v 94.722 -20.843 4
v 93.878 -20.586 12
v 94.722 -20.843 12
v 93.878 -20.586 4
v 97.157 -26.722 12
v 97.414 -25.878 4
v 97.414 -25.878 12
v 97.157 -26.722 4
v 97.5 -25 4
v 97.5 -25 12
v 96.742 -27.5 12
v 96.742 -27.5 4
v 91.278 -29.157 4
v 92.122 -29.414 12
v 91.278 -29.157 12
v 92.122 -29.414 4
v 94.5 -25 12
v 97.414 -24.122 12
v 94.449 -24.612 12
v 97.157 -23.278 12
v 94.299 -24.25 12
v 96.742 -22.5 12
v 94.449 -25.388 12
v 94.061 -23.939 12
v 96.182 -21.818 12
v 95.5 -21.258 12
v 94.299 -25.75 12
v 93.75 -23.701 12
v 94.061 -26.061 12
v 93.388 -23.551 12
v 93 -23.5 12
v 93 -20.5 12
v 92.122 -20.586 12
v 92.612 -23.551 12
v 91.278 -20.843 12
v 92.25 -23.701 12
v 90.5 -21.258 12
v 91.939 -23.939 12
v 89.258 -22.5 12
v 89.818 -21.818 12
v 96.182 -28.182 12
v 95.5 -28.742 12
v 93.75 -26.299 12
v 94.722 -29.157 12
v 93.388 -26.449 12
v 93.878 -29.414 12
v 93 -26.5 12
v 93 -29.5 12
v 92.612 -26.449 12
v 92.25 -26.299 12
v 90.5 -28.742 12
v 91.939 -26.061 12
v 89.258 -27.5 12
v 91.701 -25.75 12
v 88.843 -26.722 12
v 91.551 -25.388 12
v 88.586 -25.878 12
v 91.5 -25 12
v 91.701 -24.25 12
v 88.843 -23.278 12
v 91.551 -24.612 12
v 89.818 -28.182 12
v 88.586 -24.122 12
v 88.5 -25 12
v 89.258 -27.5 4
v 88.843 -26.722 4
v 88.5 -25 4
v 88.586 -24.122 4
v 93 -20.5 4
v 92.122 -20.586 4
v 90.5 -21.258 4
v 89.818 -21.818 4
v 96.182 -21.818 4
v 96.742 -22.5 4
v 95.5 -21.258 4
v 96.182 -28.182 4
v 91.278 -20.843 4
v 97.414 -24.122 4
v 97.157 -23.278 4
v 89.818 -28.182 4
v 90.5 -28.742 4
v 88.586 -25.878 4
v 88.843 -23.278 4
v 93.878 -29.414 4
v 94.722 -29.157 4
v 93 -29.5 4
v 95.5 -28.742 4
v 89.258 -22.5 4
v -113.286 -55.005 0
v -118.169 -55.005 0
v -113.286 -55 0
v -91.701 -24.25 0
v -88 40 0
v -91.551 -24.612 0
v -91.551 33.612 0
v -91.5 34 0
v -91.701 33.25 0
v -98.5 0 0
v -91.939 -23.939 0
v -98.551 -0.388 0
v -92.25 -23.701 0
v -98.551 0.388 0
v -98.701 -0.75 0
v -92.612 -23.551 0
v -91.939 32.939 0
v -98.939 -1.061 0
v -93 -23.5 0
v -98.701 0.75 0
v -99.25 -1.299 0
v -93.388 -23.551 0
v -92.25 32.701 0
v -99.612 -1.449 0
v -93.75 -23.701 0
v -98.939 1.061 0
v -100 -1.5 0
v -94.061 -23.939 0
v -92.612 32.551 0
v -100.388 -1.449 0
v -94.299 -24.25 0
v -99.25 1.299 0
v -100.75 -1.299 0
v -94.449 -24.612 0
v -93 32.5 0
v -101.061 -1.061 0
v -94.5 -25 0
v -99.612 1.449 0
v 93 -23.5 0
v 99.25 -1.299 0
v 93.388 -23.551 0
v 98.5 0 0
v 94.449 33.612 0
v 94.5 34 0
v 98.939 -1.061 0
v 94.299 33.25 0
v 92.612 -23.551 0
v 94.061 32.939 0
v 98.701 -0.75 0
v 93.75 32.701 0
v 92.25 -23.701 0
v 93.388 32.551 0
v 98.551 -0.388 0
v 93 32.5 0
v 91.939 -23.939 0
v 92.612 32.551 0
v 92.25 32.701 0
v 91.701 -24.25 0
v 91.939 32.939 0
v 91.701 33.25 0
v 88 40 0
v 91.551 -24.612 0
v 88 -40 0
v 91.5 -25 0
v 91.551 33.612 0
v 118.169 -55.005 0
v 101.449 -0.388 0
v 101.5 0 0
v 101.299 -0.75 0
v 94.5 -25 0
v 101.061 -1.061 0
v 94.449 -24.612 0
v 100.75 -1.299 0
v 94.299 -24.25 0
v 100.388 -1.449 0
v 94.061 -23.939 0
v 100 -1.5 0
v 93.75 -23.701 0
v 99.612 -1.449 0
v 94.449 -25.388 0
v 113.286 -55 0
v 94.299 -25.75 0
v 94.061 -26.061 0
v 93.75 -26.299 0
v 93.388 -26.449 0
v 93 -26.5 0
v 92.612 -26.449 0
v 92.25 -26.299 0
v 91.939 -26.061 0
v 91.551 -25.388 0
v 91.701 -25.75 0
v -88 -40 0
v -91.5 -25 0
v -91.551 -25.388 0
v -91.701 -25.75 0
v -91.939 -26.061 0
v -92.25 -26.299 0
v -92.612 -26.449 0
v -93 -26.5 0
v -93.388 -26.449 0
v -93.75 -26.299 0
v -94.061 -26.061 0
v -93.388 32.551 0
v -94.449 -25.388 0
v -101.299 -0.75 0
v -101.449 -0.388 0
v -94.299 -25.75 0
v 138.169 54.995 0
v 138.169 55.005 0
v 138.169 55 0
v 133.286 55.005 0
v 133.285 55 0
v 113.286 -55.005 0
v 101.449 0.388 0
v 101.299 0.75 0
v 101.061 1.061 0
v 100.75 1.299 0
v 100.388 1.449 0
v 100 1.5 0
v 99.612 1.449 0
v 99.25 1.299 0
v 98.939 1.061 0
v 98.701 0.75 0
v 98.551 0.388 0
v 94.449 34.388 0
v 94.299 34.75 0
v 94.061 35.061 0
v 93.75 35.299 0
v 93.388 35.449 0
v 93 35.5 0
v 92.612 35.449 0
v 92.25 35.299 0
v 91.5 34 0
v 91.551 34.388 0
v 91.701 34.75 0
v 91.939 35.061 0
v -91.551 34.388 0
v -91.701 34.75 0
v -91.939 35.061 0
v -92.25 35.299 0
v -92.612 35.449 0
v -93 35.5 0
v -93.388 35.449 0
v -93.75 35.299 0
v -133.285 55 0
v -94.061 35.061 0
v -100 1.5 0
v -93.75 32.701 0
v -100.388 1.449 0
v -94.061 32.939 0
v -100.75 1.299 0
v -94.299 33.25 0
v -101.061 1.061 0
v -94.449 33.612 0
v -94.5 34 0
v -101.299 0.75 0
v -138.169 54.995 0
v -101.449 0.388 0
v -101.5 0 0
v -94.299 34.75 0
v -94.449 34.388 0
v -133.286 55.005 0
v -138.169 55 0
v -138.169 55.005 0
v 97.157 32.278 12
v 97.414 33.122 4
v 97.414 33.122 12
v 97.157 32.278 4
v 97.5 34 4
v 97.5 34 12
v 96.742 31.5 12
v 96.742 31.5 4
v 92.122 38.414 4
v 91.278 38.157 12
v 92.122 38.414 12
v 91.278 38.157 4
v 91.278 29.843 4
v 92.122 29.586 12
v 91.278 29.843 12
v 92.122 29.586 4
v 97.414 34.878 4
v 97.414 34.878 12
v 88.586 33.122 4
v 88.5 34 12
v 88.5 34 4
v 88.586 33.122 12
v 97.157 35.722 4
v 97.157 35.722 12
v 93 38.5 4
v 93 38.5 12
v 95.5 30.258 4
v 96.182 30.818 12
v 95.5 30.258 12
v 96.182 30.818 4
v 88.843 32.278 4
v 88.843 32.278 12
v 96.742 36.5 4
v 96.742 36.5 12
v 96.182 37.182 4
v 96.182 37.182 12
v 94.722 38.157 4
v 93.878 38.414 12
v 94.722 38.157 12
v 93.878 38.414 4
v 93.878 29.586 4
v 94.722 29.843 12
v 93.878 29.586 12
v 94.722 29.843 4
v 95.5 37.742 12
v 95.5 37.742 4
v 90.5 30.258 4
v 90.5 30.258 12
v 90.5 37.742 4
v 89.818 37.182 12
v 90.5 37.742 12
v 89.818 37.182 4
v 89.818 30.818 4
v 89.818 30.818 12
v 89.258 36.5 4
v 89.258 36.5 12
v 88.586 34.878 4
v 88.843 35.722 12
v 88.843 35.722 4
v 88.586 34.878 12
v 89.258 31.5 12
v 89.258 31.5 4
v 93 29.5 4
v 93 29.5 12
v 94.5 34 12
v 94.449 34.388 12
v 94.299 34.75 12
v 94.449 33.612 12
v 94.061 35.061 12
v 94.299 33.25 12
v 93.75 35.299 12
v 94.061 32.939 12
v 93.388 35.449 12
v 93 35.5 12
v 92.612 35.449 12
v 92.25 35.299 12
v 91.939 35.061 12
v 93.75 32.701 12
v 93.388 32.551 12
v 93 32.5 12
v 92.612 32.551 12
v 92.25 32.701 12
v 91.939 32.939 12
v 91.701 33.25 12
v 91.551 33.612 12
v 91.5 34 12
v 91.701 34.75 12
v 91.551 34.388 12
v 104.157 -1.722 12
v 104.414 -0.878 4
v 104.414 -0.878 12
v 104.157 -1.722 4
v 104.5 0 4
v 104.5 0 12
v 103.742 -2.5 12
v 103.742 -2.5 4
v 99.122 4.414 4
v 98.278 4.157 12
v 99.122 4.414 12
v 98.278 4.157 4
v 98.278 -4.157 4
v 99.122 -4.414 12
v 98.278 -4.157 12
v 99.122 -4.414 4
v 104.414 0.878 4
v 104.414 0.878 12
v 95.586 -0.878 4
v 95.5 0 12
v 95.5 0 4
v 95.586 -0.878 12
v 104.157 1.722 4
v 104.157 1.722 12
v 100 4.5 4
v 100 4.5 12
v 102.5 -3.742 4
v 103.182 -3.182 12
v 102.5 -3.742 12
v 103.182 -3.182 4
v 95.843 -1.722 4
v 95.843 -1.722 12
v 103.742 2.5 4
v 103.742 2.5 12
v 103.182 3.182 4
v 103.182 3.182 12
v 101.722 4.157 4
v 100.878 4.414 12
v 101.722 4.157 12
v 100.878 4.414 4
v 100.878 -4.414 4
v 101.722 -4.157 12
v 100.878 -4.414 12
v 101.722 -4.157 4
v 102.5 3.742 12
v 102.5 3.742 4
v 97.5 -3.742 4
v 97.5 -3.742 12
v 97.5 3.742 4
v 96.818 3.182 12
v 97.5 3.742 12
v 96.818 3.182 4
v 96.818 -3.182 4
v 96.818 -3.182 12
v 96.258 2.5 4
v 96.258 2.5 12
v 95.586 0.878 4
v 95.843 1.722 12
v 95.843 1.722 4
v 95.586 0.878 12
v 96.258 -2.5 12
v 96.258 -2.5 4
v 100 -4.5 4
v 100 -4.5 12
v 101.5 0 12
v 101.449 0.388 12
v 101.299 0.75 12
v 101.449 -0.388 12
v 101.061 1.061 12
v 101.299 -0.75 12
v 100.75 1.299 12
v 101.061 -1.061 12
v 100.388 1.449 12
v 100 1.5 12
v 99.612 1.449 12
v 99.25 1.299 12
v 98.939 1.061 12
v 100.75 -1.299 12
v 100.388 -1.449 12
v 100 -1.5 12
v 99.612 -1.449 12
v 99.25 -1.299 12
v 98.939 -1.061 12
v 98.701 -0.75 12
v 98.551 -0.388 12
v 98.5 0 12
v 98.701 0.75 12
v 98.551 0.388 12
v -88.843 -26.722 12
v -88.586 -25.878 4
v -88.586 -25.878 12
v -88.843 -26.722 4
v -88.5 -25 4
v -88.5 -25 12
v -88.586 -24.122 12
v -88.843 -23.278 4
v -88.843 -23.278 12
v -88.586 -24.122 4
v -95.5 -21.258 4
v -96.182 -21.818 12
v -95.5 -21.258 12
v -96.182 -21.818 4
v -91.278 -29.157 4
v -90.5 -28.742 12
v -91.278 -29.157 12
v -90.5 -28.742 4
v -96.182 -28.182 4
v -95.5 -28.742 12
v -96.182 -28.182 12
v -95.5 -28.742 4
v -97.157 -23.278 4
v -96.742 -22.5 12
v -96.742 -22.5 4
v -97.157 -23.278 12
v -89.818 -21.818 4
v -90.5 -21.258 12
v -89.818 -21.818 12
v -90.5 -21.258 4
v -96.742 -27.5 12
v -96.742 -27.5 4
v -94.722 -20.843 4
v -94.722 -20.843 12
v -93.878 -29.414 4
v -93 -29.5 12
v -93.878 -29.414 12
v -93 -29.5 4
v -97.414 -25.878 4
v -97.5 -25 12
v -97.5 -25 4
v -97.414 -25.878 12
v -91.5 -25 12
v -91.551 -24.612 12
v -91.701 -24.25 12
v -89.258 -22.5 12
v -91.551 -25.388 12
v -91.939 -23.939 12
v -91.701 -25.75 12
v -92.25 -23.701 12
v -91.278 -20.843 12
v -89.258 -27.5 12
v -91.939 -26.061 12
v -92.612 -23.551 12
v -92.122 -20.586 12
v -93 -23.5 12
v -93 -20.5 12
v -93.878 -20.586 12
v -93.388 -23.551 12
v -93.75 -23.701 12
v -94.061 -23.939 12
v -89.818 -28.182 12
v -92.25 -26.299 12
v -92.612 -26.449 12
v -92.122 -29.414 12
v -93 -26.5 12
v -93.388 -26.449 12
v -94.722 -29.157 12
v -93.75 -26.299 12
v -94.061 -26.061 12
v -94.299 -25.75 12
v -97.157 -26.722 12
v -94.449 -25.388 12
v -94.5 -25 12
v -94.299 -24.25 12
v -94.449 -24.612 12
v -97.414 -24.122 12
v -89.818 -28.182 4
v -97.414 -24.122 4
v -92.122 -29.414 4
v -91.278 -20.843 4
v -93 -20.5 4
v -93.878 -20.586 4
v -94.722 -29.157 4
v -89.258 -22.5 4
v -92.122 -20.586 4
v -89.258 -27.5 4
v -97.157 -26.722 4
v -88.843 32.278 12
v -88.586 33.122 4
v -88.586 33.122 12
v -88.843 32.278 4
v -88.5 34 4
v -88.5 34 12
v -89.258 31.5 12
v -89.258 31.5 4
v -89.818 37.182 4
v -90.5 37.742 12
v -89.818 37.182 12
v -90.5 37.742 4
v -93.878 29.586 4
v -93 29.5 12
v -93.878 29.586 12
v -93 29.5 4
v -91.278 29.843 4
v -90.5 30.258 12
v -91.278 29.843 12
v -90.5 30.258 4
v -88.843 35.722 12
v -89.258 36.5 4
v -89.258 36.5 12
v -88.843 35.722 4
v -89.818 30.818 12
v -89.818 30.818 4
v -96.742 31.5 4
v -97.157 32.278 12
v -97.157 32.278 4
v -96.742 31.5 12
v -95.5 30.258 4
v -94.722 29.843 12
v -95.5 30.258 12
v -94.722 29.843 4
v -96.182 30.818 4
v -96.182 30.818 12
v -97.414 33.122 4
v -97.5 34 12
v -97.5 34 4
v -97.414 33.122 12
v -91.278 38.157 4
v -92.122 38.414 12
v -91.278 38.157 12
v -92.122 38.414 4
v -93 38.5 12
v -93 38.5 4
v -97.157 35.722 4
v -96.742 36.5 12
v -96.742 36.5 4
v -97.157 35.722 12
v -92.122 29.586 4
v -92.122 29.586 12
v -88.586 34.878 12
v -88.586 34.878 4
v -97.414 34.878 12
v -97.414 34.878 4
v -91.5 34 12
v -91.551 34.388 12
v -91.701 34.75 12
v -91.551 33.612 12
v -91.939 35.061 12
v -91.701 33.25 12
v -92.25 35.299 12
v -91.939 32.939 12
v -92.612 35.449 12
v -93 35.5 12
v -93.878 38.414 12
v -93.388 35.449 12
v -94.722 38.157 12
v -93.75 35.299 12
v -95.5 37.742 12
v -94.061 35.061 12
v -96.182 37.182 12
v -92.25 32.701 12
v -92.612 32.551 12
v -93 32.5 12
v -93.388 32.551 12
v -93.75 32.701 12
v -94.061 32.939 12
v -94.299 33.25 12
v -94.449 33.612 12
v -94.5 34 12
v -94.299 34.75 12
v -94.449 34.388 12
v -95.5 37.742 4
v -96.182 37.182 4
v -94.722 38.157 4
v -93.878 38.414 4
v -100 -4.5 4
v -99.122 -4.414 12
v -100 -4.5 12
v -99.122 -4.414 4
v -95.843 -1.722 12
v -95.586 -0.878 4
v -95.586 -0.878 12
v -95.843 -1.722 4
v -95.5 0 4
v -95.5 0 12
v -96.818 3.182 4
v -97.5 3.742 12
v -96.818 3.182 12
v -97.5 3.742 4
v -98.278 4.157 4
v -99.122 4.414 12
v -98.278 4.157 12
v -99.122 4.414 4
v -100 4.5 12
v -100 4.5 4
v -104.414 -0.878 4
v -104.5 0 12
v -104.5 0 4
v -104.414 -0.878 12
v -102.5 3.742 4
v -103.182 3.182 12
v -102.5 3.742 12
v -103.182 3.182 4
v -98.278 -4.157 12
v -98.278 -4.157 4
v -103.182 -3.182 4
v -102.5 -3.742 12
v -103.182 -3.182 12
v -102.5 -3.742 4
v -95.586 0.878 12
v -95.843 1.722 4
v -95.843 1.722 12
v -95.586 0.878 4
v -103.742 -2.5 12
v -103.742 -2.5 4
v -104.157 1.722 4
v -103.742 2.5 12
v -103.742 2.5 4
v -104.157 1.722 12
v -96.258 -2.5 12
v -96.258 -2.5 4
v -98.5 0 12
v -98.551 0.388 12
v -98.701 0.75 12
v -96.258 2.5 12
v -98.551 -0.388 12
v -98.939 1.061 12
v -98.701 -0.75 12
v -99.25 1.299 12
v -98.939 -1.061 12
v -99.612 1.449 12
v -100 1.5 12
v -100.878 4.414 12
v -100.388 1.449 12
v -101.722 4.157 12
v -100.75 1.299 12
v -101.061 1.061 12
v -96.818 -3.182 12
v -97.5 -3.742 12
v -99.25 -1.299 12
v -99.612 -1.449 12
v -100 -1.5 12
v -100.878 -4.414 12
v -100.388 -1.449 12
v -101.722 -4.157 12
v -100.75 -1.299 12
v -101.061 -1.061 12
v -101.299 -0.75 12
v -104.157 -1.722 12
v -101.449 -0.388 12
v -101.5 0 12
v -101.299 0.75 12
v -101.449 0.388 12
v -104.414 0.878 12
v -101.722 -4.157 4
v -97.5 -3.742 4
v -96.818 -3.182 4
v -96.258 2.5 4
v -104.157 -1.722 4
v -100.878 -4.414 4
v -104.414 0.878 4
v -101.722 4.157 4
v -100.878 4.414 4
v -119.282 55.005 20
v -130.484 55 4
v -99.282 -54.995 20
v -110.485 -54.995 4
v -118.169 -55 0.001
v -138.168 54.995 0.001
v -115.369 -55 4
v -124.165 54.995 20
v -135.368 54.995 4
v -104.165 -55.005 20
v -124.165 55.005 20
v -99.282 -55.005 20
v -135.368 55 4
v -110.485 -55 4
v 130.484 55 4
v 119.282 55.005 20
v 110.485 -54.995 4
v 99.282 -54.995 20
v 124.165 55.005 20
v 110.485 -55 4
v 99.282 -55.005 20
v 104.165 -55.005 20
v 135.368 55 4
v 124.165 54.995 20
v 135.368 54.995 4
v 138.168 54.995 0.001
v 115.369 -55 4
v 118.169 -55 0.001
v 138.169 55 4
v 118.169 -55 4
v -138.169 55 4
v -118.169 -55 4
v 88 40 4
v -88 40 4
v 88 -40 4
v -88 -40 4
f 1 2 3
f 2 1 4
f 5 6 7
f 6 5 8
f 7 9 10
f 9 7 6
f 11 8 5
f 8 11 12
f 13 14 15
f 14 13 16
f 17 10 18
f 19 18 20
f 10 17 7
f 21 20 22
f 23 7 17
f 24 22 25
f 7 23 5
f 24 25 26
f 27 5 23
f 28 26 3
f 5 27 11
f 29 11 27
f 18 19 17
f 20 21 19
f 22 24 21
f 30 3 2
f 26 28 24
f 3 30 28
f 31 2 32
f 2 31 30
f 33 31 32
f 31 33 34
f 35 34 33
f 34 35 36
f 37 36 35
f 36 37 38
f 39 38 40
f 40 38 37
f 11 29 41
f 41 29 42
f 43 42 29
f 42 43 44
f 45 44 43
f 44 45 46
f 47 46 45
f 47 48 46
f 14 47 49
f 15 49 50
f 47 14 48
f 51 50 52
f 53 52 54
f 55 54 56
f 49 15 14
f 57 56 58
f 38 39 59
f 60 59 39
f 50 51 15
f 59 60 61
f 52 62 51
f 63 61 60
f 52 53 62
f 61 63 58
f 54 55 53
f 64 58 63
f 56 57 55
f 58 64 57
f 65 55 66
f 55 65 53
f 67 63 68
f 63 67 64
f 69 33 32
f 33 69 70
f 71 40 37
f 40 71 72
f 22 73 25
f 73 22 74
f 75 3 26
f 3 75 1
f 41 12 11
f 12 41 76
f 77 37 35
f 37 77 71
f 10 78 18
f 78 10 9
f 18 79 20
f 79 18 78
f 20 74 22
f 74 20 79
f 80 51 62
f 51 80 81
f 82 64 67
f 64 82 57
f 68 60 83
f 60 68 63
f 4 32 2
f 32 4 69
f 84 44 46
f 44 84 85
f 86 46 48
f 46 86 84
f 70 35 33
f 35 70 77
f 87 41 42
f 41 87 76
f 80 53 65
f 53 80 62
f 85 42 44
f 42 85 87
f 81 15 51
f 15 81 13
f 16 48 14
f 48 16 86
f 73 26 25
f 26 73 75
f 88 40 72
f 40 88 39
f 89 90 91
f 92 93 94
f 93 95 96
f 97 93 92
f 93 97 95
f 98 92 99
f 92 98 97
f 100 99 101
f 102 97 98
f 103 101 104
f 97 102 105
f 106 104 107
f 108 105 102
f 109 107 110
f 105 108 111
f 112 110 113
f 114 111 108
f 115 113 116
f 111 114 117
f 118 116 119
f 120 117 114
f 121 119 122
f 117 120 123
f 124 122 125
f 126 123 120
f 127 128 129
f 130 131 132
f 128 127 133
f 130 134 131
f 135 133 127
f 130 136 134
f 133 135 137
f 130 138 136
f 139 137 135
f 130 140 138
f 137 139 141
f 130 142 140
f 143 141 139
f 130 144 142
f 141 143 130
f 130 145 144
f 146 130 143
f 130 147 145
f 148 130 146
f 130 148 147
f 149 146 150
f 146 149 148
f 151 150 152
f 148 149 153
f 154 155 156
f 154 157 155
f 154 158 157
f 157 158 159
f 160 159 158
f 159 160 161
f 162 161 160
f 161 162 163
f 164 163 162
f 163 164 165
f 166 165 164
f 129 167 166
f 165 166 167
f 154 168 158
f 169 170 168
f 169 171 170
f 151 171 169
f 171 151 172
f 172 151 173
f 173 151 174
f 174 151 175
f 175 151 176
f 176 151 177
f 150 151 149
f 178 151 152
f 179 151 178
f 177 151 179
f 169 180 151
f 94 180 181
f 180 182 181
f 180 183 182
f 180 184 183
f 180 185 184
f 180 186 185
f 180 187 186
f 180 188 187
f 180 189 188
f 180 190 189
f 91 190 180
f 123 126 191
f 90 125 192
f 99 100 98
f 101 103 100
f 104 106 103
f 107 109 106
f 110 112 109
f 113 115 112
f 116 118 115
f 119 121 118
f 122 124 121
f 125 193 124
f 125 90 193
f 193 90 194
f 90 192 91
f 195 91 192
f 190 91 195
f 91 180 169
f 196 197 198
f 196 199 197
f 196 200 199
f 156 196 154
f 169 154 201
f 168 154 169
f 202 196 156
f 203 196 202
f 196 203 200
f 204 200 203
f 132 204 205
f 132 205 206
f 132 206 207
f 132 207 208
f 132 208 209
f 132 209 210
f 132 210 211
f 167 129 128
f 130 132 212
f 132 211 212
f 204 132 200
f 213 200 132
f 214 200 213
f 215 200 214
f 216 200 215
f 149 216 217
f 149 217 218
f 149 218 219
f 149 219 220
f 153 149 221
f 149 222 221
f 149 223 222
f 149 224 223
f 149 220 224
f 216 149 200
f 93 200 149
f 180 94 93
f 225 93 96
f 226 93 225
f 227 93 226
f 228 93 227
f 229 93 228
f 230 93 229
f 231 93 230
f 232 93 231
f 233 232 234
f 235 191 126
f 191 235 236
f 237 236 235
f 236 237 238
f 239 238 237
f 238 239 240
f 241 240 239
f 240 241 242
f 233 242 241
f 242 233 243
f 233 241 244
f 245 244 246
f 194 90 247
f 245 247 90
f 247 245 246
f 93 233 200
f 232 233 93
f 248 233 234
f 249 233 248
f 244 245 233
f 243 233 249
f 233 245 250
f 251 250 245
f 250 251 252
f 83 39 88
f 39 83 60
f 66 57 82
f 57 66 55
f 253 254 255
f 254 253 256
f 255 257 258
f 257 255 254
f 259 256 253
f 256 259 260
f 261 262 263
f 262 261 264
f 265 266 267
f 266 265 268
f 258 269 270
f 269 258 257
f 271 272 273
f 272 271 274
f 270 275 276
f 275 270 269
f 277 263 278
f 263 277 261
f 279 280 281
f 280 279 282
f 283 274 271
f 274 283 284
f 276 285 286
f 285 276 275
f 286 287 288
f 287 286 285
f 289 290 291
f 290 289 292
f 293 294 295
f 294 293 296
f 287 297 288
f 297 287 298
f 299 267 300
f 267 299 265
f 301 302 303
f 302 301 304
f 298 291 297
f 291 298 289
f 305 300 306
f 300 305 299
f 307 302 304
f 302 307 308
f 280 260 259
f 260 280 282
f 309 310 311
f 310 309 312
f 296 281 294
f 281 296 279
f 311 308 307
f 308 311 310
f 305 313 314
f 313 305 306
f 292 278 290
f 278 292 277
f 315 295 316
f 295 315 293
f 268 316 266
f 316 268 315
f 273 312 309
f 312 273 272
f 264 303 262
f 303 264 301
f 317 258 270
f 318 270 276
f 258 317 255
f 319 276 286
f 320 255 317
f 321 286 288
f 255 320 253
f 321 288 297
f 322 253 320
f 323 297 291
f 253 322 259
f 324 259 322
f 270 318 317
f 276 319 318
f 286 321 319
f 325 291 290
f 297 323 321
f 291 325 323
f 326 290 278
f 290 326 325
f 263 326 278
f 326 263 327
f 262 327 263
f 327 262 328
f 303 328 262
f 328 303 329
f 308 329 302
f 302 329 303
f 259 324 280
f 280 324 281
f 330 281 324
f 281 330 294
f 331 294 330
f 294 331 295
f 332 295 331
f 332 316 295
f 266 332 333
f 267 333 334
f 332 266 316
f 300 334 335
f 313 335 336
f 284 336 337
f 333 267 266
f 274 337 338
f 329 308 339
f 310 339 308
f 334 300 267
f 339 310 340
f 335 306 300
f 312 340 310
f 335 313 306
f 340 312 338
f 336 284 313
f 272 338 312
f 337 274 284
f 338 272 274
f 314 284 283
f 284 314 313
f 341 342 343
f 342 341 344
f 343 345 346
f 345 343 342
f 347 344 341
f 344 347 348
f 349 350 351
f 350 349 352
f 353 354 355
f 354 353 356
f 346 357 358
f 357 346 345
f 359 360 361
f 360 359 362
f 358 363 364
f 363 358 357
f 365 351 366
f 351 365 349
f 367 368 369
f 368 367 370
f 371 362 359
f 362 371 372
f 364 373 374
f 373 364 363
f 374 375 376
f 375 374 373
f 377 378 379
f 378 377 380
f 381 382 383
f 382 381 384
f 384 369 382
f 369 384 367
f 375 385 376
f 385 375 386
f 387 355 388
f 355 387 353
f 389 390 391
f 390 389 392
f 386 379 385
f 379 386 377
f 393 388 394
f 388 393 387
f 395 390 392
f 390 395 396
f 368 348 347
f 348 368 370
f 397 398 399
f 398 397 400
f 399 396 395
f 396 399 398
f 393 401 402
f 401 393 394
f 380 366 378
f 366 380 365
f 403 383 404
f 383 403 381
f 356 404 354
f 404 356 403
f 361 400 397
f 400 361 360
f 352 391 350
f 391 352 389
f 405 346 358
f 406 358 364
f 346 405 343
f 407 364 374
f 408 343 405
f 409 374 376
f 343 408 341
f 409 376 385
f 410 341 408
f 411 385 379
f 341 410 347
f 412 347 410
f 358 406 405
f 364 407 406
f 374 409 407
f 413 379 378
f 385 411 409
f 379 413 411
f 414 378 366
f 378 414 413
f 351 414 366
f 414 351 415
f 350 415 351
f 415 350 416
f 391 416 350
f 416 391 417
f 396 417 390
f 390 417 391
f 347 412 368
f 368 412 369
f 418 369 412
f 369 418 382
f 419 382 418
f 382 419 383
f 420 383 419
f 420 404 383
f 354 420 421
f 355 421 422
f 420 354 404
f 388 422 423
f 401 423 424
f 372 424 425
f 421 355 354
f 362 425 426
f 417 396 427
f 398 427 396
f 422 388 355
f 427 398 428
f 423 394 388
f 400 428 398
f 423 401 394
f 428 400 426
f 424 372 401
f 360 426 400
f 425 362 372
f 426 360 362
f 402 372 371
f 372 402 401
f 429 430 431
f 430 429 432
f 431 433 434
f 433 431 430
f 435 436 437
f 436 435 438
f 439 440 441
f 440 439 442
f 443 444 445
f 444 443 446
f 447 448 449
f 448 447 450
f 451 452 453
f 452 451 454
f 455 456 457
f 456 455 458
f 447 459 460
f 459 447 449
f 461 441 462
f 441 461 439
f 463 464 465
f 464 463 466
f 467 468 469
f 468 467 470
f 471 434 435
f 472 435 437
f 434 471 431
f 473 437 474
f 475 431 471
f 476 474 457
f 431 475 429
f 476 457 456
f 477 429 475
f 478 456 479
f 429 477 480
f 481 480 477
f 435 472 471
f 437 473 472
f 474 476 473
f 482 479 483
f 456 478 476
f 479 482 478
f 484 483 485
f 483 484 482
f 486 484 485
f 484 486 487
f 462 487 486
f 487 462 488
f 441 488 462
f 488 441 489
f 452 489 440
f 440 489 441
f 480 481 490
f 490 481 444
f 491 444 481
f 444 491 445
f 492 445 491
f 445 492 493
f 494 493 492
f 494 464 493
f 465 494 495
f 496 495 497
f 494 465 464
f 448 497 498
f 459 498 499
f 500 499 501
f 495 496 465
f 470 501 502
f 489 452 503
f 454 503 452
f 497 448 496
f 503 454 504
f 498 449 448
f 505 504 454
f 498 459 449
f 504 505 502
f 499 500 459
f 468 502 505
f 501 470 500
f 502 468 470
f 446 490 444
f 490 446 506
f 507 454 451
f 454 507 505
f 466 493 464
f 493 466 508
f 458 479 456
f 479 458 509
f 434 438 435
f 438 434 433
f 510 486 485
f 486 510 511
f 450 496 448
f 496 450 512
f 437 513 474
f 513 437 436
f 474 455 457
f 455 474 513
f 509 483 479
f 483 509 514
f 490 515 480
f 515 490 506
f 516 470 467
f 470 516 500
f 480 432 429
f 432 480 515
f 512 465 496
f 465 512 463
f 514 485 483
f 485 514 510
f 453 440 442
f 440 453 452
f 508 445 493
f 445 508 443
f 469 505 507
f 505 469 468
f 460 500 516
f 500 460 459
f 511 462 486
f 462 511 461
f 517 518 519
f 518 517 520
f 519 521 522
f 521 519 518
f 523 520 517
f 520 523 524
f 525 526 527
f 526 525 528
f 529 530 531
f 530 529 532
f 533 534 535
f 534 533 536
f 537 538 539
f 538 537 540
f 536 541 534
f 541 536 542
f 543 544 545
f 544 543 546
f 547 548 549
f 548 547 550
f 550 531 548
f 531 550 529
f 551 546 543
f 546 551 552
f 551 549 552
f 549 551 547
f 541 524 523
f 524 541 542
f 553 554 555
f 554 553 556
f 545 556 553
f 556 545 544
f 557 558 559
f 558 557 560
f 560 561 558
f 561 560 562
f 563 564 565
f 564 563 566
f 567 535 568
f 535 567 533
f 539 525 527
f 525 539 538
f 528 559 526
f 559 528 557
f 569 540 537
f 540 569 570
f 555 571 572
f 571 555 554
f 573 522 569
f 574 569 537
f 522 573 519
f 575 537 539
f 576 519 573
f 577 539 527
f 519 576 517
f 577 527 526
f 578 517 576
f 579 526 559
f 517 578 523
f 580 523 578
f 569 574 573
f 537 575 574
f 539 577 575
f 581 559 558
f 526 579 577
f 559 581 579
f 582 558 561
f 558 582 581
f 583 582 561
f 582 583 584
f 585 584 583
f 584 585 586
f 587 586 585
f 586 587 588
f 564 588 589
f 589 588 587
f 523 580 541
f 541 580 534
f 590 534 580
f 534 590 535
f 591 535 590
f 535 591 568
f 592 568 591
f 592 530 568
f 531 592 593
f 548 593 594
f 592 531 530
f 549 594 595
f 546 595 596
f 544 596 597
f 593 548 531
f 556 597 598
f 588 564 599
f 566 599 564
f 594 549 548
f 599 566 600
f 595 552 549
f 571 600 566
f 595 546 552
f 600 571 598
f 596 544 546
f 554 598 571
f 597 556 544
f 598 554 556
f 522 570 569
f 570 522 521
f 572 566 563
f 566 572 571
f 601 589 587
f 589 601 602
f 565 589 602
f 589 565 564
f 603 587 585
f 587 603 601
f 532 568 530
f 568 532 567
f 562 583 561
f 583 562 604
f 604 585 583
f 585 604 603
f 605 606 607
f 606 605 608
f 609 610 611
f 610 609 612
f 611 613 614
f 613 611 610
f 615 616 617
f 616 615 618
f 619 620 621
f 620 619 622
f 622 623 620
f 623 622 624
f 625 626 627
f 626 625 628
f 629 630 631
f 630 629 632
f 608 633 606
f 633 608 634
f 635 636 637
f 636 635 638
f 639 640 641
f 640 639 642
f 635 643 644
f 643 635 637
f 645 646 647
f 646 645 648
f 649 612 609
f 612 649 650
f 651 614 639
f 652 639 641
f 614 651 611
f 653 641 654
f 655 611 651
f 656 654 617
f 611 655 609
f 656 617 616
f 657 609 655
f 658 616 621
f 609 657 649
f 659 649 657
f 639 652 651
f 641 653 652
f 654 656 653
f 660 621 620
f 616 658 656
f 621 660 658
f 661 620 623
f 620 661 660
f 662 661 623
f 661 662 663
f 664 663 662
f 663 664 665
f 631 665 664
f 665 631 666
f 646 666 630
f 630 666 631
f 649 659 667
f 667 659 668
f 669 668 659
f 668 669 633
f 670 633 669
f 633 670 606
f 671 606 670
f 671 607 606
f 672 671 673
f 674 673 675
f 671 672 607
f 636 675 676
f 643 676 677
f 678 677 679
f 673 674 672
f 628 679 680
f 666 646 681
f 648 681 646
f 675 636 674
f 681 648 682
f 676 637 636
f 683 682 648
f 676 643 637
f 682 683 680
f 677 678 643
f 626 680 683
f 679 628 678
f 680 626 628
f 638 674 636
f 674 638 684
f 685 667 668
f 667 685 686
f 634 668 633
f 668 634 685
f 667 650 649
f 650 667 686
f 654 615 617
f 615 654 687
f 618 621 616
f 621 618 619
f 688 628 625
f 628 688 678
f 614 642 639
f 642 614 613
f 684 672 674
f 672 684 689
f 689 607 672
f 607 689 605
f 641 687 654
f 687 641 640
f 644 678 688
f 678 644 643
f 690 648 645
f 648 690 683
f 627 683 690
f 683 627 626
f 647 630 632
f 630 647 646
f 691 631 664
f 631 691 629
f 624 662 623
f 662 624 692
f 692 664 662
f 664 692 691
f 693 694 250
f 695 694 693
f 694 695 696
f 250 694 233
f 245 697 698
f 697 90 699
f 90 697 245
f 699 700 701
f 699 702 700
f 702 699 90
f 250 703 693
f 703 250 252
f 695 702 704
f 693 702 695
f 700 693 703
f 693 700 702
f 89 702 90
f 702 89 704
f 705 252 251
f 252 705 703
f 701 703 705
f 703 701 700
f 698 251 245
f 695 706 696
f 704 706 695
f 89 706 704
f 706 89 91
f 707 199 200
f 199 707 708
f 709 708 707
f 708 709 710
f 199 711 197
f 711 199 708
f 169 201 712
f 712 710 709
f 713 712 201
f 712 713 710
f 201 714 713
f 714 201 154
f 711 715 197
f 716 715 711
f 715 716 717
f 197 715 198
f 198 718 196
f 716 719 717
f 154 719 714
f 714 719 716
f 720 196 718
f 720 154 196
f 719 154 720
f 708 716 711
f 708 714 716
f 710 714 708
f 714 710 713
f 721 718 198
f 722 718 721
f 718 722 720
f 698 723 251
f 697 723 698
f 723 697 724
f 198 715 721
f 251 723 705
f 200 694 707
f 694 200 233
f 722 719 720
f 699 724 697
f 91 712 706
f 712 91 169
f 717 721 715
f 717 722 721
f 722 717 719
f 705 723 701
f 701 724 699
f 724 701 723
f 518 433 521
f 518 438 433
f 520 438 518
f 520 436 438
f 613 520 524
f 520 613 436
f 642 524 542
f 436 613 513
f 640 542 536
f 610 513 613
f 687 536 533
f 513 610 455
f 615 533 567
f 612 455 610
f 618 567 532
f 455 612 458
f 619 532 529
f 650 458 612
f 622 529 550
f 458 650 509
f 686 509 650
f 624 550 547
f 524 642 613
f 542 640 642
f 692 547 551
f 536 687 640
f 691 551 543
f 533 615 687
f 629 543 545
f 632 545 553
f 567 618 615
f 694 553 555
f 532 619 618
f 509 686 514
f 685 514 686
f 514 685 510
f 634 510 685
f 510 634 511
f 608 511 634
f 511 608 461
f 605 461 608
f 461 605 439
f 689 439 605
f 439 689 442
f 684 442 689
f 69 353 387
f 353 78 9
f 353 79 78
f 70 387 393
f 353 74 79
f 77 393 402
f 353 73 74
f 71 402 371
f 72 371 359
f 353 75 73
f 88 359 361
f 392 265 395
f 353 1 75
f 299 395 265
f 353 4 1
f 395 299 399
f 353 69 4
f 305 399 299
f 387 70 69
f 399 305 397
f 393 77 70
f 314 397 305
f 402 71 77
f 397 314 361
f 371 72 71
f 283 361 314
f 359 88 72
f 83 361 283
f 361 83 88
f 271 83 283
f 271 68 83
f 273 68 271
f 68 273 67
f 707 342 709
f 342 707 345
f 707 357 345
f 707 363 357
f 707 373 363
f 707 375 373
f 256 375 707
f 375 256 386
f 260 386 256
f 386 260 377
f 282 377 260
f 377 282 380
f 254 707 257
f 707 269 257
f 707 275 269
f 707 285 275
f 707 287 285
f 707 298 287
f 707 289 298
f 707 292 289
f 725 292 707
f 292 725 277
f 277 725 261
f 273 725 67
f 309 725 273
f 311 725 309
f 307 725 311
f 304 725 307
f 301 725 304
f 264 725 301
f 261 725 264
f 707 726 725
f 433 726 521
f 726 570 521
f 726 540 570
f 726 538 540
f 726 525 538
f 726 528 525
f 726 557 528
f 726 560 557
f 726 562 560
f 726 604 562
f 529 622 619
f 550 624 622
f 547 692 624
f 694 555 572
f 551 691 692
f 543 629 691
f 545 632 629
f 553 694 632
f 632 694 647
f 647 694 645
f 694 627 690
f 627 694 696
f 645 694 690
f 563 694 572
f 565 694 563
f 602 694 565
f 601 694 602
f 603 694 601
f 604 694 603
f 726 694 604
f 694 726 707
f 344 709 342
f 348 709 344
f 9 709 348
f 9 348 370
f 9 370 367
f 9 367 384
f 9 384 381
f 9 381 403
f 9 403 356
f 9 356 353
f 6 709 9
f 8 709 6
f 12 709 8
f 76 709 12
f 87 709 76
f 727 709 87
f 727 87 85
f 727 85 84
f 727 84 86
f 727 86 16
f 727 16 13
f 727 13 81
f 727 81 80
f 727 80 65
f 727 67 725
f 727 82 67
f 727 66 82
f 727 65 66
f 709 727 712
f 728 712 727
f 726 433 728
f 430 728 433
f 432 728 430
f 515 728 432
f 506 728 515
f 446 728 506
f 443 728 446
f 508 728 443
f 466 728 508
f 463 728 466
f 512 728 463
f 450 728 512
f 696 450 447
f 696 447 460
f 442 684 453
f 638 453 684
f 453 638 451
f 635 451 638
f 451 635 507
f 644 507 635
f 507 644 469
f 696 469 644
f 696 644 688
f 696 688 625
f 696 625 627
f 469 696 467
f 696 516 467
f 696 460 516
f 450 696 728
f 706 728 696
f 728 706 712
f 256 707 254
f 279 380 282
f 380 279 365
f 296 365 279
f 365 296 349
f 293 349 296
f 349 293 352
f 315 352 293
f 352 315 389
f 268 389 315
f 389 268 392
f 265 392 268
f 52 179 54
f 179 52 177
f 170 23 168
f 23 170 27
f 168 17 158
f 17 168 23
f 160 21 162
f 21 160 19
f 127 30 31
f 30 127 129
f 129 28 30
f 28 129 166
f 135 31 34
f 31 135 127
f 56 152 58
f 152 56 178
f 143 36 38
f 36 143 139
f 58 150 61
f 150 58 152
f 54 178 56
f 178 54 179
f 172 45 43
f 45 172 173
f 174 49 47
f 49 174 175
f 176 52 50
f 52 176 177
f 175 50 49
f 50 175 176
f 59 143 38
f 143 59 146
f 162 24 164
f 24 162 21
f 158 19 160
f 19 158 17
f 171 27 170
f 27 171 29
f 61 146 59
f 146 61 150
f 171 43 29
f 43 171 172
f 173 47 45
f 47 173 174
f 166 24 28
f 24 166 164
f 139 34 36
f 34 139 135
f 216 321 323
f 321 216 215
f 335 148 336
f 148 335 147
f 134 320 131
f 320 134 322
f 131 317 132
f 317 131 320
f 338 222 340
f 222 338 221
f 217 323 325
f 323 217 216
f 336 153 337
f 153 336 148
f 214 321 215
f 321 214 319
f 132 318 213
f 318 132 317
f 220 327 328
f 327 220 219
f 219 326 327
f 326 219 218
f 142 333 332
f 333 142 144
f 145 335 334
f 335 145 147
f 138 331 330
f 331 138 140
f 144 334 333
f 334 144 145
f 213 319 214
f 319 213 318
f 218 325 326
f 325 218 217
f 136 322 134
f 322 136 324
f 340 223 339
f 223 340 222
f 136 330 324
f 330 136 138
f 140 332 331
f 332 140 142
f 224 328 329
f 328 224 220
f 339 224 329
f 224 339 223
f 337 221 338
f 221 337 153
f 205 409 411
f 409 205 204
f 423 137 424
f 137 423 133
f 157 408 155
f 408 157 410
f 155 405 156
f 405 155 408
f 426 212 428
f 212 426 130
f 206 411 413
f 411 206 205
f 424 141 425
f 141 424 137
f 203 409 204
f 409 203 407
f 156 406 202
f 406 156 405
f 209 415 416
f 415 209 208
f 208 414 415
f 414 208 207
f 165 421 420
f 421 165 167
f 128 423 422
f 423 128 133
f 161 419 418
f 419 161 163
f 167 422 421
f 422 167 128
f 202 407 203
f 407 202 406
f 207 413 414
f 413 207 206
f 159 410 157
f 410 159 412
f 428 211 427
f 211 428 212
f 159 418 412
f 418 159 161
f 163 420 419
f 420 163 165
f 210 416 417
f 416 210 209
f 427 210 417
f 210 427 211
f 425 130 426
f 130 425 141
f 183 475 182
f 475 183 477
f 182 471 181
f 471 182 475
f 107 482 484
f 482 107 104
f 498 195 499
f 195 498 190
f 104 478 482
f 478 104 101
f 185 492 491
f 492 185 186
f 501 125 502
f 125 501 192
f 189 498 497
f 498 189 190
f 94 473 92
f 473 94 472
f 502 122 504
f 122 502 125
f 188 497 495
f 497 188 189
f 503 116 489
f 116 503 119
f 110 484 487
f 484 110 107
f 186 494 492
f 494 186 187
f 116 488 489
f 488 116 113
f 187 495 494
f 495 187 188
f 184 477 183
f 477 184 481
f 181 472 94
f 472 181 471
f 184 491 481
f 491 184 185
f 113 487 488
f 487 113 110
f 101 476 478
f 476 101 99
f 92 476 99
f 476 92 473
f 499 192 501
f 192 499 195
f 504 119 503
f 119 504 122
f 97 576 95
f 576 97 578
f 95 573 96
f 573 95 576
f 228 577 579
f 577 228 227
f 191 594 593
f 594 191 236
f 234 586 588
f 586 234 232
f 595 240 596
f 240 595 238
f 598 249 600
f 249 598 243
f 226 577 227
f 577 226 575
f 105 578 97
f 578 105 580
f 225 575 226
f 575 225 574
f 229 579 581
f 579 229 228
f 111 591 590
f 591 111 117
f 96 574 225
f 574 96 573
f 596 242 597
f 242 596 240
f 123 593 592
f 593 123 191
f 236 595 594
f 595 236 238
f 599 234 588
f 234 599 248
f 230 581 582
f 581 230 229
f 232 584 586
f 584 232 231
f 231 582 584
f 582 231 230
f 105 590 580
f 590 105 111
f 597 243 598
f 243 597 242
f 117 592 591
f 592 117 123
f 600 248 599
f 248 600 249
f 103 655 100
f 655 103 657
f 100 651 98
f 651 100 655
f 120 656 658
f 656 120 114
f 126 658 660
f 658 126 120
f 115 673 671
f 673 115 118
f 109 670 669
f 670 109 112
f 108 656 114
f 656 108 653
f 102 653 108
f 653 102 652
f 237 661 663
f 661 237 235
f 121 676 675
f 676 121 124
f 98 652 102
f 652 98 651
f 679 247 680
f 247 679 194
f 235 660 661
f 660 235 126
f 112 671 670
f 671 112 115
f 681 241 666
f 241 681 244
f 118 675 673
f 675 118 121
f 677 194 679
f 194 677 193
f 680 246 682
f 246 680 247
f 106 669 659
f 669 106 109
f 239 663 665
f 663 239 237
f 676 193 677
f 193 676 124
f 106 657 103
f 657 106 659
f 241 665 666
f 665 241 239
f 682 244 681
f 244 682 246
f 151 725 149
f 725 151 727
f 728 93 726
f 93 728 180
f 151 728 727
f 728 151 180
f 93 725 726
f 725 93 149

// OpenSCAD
// Shower-sump platform: a flat deck the size of the sump's base, set at the height where the sump's
// wings just reach the hull. Its two long edges are skirts leaning in at the hull's angle; they are the
// bonding faces, bedded in thickened epoxy or 5200. Nothing reaches down to the keel.
// Installed axes: X across the boat, Y fore-aft (+Y toward the bow), Z up; z = 0 at the deck's top.
// Print: deck on the bed (part = "print", the default). The skirts lean in 90 - hull_angle from vertical.

part = "print";      // [print, installed]

/* [Sump base, which sets the deck (unmeasured; Fusion v6 numbers)] */
w_aft = 280;         // across the boat at the aft edge, hull to hull at deck height
w_fwd = 240;         // same at the forward edge: the V toward the bow (Fusion v6: 18 per 100 each side)
len = 110;           // fore-aft

/* [Hull] */
hull_angle = 55;     // degrees above horizontal across the boat at the bond line: the bilge V (Fusion v6 legs)

/* [Sump screws and opening (from the Fusion v6 deck)] */
holes = [[93, 25], [93, -34], [100, 0], [-93, 25], [-93, -34], [-100, 0]];   // the sump's wing holes
hole_d = 3;          // self-tapping pilot, as Fusion had it
boss_d = 9;
boss_h = 12;         // screw depth below the deck top
opening = [176, 80]; // cut out of the deck's middle, under the sump

/* [Build] */
deck_t = 4;
skirt_h = 20;        // vertical depth of the bonding face
skirt_t = 4;         // measured square to the face
bond_gap = 1.5;      // adhesive, each side: the skirt sits this far inside the hull line

e = 0.01;
run = skirt_h / tan(hull_angle);              // inward step of the skirt over its depth
tn = skirt_t / sin(hull_angle);               // skirt thickness, measured across X

// deck and skirts apart: a hull() of whole end sections would fill the space under the deck
module platform() difference() {
  frame();
  for (h = holes) translate([h[0], h[1], -boss_h - e]) cylinder(d = hole_d, h = boss_h + 2 * e, $fn = 24);
  translate([-opening[0] / 2, -opening[1] / 2, -deck_t - e]) cube([opening[0], opening[1], deck_t + 2 * e]);
}

module frame() {
  hw_a = w_aft / 2 - bond_gap / sin(hull_angle);
  hw_f = w_fwd / 2 - bond_gap / sin(hull_angle);
  // deck: a trapezoid in plan
  translate([0, 0, -deck_t]) linear_extrude(deck_t)
    polygon([[-hw_a, -len / 2], [hw_a, -len / 2], [hw_f, len / 2], [-hw_f, len / 2]]);
  for (h = holes) translate([h[0], h[1], -boss_h]) cylinder(d = boss_d, h = boss_h, $fn = 32);
  for (s = [-1, 1]) hull() for (p = [[hw_a, -len / 2], [hw_f, len / 2]])
    translate([0, p[1], 0]) rotate([90, 0, 0]) linear_extrude(e, center = true)
      scale([s, 1]) polygon([[p[0], 0], [p[0] - run, -skirt_h], [p[0] - run - tn, -skirt_h], [p[0] - tn, 0]]);
}

if (part == "installed") platform();
else rotate([180, 0, 0]) platform();
